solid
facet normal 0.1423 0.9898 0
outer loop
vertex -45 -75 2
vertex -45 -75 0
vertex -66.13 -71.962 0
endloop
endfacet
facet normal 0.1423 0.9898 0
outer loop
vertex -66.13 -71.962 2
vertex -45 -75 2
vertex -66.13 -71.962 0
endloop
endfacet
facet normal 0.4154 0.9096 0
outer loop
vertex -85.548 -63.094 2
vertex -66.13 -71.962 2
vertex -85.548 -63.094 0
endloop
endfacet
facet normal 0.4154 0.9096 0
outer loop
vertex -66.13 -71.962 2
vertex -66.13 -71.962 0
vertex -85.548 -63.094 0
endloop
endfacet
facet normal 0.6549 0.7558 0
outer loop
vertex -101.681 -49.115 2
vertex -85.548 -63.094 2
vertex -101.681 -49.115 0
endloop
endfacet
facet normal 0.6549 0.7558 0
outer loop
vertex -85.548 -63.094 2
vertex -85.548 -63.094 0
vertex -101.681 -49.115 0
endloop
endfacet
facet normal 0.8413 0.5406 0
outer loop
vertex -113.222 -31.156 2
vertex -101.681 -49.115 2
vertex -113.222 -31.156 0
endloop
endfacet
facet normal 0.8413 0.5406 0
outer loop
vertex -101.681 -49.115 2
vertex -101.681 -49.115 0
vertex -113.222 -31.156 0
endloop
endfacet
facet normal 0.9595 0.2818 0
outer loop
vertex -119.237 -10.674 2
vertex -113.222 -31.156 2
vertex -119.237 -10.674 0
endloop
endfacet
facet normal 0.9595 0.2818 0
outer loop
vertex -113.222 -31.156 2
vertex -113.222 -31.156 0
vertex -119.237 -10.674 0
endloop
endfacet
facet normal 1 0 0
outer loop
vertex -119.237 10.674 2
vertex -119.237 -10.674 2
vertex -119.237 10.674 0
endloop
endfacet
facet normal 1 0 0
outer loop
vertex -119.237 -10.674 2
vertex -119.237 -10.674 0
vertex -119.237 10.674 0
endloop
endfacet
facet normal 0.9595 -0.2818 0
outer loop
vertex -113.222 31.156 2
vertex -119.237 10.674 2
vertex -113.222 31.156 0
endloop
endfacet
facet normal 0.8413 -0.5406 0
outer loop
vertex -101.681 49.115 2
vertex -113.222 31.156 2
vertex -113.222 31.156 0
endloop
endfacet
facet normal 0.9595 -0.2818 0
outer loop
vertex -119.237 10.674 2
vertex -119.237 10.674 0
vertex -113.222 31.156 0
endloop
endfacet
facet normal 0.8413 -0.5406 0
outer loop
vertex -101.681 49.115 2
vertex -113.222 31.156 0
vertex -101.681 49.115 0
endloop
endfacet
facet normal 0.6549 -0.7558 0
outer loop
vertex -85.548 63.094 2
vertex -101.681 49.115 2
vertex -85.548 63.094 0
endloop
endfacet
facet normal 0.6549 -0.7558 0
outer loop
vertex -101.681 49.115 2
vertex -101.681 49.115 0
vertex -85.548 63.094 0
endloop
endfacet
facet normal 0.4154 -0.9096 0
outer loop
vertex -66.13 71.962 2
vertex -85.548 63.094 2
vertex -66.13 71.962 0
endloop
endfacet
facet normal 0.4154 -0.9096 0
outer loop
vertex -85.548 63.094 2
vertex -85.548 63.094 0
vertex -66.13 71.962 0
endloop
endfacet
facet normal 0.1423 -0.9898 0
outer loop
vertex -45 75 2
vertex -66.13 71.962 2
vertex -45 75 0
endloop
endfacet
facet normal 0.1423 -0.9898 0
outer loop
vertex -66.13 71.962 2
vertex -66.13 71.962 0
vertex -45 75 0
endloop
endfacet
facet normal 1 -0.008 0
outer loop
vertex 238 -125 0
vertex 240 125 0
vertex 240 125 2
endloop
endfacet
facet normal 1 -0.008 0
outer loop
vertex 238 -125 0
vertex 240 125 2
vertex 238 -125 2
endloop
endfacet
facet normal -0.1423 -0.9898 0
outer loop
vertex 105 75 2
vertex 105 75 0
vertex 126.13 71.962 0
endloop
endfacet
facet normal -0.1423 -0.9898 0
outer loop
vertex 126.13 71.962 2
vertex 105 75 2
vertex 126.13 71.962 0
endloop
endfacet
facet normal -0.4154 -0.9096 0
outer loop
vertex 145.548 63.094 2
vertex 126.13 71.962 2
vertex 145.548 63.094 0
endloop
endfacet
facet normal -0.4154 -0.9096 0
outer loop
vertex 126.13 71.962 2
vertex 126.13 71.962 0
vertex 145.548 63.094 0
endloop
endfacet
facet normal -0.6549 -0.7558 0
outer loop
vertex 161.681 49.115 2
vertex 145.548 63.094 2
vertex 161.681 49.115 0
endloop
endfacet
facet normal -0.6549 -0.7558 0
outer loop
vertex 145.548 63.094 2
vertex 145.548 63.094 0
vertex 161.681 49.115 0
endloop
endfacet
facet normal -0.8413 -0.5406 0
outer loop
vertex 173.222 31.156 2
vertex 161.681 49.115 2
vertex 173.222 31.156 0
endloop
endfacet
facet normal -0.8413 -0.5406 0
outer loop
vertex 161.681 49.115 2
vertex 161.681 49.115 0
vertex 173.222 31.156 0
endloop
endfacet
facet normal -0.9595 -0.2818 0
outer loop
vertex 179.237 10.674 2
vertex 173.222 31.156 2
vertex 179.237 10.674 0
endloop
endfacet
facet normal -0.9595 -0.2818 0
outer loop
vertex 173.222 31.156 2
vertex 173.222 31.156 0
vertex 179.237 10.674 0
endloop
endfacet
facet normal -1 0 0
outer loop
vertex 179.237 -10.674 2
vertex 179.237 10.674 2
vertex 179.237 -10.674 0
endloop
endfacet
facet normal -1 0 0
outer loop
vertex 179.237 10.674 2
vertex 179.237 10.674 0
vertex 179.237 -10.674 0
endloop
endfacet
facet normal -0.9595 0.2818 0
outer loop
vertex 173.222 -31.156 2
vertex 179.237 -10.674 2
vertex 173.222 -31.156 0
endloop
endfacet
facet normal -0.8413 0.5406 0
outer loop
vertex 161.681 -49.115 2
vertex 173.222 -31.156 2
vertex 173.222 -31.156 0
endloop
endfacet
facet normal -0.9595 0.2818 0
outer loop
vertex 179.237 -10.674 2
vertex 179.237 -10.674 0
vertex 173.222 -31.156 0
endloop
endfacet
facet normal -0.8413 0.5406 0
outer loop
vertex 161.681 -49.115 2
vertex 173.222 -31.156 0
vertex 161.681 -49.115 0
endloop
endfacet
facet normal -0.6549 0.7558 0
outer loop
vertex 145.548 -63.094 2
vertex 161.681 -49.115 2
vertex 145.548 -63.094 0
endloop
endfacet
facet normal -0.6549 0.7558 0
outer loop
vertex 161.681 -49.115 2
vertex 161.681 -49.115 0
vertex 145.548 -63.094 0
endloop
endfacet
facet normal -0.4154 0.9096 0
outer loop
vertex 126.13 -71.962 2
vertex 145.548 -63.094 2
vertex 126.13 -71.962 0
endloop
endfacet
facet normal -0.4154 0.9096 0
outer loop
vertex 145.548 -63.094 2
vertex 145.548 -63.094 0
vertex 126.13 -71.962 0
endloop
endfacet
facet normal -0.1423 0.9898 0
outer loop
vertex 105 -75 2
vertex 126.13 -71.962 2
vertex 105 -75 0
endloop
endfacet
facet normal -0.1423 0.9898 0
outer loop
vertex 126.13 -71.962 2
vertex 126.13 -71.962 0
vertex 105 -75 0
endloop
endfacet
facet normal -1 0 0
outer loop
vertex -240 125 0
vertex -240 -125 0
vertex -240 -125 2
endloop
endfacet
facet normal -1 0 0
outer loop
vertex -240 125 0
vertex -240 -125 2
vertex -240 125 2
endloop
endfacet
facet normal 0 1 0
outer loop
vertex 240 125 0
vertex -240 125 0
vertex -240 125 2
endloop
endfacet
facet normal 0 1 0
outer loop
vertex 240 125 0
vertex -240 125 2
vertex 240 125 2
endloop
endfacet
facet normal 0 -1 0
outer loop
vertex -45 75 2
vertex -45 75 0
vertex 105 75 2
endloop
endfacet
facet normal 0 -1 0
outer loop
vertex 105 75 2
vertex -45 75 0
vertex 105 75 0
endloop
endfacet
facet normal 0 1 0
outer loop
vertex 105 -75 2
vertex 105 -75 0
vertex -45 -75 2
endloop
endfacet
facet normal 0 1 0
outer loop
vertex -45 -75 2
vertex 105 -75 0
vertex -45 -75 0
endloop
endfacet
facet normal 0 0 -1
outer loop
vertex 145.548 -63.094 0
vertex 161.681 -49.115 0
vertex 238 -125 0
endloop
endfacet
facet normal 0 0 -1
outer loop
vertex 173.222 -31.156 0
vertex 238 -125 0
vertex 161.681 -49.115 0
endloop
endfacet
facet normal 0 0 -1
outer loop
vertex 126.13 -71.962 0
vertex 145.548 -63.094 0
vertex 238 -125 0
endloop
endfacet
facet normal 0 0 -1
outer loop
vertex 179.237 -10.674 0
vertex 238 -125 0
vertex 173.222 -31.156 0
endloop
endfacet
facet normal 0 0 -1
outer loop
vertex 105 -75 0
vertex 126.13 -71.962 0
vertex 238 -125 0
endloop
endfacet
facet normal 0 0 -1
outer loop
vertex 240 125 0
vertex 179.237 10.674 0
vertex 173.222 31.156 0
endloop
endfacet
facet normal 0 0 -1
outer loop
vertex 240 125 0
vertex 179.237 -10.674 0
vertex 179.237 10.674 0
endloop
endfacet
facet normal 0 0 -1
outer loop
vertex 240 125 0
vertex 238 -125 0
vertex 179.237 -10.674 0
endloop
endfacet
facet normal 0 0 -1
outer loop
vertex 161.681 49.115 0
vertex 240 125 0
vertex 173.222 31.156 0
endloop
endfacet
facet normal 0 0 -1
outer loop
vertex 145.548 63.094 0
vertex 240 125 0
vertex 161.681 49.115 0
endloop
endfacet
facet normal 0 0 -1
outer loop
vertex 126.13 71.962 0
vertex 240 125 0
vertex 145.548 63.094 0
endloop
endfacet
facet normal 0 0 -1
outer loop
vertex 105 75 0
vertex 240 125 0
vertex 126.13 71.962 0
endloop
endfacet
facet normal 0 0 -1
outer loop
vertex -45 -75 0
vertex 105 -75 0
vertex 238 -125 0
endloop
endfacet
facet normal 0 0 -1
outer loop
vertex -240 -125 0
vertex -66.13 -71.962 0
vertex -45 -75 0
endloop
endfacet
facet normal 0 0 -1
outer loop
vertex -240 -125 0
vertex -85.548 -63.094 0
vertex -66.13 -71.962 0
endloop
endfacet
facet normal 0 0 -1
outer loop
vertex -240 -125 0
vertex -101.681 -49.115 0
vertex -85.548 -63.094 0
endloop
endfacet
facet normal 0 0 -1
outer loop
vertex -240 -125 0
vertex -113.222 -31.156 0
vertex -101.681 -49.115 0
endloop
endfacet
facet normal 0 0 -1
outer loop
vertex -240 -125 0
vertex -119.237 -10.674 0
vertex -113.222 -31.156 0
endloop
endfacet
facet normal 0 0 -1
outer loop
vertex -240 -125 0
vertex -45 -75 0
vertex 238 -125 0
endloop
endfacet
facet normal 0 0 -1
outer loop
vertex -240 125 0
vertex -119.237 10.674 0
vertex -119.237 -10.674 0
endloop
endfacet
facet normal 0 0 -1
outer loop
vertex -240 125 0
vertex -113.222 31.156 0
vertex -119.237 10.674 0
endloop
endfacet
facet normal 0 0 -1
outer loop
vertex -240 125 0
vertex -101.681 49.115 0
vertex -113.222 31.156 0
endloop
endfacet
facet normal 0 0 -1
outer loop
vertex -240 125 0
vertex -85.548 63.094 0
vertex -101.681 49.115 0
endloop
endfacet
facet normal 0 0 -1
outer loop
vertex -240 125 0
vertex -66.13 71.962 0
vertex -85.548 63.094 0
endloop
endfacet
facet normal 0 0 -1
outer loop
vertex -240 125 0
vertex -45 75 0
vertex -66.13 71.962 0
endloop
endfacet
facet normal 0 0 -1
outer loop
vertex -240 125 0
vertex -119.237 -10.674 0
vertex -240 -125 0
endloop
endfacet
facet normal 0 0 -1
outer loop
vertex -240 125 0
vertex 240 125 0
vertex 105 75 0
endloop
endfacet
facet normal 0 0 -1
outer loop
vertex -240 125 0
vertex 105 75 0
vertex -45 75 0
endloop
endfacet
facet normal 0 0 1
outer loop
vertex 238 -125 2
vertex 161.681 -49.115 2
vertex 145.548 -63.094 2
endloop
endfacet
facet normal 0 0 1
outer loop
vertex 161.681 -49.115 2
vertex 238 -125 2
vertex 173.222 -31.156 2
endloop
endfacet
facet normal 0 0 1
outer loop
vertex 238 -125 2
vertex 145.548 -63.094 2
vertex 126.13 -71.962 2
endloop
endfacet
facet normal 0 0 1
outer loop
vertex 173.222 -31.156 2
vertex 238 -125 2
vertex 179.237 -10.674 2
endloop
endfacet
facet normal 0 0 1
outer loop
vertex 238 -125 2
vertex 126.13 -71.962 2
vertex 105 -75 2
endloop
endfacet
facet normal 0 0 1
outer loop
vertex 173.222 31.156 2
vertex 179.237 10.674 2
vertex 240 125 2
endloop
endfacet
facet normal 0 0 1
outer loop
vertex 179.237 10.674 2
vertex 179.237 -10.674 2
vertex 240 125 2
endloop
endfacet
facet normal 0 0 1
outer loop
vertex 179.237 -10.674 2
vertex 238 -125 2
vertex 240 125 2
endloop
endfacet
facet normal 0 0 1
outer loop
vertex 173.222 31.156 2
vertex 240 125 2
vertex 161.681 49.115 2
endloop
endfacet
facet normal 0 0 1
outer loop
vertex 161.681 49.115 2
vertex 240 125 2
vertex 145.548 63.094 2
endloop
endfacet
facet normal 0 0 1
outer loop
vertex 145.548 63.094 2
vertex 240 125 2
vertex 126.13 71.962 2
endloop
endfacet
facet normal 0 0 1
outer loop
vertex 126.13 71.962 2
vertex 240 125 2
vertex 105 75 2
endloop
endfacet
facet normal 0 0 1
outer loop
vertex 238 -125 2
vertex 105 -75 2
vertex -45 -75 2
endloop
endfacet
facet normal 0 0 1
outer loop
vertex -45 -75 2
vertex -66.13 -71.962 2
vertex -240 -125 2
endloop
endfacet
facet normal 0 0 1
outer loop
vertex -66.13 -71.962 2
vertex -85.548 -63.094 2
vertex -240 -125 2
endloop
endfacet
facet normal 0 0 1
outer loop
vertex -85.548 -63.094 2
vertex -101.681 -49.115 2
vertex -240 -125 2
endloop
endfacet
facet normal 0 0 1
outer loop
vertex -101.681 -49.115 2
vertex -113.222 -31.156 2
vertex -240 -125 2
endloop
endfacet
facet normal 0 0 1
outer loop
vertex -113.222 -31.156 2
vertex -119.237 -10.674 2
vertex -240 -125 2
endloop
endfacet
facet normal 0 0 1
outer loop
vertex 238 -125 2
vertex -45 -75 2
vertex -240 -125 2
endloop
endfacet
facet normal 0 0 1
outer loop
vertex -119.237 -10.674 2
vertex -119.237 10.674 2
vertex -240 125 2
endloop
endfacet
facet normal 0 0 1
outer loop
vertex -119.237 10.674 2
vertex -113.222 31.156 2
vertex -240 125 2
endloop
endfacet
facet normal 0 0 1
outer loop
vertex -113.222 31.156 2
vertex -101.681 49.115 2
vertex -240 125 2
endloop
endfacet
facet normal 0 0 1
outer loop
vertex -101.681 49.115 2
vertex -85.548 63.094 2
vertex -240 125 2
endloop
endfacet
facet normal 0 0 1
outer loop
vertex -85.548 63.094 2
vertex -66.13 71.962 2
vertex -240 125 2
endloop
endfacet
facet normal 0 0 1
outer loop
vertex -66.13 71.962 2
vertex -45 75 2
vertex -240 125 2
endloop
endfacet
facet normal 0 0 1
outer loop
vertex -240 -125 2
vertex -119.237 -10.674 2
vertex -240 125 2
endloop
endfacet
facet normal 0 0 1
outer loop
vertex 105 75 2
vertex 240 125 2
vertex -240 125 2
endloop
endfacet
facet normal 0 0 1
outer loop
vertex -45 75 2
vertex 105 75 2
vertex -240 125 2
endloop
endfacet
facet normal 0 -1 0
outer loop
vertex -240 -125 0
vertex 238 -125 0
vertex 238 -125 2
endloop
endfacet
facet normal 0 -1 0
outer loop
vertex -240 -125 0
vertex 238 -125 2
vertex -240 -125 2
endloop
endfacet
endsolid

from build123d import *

# Parameters (mm, degrees)
BOSS_EXTRUDE1_DEPTH = 2


with BuildPart() as part:
    # Model → Boss-Extrude1 (new body)
    with BuildSketch(Plane.XY):
        Polygon((-240, 125), (240, 125), (238, -125), (-240, -125), align=None)
        with BuildLine():
            Line((-45, 75), (105, 75))
            ThreePointArc((105, 75), (180, 0), (105, -75))
            Line((105, -75), (-45, -75))
            ThreePointArc((-45, -75), (-120, 0), (-45, 75))
        make_face(mode=Mode.SUBTRACT)
    extrude(amount=BOSS_EXTRUDE1_DEPTH)


solid = part.part
